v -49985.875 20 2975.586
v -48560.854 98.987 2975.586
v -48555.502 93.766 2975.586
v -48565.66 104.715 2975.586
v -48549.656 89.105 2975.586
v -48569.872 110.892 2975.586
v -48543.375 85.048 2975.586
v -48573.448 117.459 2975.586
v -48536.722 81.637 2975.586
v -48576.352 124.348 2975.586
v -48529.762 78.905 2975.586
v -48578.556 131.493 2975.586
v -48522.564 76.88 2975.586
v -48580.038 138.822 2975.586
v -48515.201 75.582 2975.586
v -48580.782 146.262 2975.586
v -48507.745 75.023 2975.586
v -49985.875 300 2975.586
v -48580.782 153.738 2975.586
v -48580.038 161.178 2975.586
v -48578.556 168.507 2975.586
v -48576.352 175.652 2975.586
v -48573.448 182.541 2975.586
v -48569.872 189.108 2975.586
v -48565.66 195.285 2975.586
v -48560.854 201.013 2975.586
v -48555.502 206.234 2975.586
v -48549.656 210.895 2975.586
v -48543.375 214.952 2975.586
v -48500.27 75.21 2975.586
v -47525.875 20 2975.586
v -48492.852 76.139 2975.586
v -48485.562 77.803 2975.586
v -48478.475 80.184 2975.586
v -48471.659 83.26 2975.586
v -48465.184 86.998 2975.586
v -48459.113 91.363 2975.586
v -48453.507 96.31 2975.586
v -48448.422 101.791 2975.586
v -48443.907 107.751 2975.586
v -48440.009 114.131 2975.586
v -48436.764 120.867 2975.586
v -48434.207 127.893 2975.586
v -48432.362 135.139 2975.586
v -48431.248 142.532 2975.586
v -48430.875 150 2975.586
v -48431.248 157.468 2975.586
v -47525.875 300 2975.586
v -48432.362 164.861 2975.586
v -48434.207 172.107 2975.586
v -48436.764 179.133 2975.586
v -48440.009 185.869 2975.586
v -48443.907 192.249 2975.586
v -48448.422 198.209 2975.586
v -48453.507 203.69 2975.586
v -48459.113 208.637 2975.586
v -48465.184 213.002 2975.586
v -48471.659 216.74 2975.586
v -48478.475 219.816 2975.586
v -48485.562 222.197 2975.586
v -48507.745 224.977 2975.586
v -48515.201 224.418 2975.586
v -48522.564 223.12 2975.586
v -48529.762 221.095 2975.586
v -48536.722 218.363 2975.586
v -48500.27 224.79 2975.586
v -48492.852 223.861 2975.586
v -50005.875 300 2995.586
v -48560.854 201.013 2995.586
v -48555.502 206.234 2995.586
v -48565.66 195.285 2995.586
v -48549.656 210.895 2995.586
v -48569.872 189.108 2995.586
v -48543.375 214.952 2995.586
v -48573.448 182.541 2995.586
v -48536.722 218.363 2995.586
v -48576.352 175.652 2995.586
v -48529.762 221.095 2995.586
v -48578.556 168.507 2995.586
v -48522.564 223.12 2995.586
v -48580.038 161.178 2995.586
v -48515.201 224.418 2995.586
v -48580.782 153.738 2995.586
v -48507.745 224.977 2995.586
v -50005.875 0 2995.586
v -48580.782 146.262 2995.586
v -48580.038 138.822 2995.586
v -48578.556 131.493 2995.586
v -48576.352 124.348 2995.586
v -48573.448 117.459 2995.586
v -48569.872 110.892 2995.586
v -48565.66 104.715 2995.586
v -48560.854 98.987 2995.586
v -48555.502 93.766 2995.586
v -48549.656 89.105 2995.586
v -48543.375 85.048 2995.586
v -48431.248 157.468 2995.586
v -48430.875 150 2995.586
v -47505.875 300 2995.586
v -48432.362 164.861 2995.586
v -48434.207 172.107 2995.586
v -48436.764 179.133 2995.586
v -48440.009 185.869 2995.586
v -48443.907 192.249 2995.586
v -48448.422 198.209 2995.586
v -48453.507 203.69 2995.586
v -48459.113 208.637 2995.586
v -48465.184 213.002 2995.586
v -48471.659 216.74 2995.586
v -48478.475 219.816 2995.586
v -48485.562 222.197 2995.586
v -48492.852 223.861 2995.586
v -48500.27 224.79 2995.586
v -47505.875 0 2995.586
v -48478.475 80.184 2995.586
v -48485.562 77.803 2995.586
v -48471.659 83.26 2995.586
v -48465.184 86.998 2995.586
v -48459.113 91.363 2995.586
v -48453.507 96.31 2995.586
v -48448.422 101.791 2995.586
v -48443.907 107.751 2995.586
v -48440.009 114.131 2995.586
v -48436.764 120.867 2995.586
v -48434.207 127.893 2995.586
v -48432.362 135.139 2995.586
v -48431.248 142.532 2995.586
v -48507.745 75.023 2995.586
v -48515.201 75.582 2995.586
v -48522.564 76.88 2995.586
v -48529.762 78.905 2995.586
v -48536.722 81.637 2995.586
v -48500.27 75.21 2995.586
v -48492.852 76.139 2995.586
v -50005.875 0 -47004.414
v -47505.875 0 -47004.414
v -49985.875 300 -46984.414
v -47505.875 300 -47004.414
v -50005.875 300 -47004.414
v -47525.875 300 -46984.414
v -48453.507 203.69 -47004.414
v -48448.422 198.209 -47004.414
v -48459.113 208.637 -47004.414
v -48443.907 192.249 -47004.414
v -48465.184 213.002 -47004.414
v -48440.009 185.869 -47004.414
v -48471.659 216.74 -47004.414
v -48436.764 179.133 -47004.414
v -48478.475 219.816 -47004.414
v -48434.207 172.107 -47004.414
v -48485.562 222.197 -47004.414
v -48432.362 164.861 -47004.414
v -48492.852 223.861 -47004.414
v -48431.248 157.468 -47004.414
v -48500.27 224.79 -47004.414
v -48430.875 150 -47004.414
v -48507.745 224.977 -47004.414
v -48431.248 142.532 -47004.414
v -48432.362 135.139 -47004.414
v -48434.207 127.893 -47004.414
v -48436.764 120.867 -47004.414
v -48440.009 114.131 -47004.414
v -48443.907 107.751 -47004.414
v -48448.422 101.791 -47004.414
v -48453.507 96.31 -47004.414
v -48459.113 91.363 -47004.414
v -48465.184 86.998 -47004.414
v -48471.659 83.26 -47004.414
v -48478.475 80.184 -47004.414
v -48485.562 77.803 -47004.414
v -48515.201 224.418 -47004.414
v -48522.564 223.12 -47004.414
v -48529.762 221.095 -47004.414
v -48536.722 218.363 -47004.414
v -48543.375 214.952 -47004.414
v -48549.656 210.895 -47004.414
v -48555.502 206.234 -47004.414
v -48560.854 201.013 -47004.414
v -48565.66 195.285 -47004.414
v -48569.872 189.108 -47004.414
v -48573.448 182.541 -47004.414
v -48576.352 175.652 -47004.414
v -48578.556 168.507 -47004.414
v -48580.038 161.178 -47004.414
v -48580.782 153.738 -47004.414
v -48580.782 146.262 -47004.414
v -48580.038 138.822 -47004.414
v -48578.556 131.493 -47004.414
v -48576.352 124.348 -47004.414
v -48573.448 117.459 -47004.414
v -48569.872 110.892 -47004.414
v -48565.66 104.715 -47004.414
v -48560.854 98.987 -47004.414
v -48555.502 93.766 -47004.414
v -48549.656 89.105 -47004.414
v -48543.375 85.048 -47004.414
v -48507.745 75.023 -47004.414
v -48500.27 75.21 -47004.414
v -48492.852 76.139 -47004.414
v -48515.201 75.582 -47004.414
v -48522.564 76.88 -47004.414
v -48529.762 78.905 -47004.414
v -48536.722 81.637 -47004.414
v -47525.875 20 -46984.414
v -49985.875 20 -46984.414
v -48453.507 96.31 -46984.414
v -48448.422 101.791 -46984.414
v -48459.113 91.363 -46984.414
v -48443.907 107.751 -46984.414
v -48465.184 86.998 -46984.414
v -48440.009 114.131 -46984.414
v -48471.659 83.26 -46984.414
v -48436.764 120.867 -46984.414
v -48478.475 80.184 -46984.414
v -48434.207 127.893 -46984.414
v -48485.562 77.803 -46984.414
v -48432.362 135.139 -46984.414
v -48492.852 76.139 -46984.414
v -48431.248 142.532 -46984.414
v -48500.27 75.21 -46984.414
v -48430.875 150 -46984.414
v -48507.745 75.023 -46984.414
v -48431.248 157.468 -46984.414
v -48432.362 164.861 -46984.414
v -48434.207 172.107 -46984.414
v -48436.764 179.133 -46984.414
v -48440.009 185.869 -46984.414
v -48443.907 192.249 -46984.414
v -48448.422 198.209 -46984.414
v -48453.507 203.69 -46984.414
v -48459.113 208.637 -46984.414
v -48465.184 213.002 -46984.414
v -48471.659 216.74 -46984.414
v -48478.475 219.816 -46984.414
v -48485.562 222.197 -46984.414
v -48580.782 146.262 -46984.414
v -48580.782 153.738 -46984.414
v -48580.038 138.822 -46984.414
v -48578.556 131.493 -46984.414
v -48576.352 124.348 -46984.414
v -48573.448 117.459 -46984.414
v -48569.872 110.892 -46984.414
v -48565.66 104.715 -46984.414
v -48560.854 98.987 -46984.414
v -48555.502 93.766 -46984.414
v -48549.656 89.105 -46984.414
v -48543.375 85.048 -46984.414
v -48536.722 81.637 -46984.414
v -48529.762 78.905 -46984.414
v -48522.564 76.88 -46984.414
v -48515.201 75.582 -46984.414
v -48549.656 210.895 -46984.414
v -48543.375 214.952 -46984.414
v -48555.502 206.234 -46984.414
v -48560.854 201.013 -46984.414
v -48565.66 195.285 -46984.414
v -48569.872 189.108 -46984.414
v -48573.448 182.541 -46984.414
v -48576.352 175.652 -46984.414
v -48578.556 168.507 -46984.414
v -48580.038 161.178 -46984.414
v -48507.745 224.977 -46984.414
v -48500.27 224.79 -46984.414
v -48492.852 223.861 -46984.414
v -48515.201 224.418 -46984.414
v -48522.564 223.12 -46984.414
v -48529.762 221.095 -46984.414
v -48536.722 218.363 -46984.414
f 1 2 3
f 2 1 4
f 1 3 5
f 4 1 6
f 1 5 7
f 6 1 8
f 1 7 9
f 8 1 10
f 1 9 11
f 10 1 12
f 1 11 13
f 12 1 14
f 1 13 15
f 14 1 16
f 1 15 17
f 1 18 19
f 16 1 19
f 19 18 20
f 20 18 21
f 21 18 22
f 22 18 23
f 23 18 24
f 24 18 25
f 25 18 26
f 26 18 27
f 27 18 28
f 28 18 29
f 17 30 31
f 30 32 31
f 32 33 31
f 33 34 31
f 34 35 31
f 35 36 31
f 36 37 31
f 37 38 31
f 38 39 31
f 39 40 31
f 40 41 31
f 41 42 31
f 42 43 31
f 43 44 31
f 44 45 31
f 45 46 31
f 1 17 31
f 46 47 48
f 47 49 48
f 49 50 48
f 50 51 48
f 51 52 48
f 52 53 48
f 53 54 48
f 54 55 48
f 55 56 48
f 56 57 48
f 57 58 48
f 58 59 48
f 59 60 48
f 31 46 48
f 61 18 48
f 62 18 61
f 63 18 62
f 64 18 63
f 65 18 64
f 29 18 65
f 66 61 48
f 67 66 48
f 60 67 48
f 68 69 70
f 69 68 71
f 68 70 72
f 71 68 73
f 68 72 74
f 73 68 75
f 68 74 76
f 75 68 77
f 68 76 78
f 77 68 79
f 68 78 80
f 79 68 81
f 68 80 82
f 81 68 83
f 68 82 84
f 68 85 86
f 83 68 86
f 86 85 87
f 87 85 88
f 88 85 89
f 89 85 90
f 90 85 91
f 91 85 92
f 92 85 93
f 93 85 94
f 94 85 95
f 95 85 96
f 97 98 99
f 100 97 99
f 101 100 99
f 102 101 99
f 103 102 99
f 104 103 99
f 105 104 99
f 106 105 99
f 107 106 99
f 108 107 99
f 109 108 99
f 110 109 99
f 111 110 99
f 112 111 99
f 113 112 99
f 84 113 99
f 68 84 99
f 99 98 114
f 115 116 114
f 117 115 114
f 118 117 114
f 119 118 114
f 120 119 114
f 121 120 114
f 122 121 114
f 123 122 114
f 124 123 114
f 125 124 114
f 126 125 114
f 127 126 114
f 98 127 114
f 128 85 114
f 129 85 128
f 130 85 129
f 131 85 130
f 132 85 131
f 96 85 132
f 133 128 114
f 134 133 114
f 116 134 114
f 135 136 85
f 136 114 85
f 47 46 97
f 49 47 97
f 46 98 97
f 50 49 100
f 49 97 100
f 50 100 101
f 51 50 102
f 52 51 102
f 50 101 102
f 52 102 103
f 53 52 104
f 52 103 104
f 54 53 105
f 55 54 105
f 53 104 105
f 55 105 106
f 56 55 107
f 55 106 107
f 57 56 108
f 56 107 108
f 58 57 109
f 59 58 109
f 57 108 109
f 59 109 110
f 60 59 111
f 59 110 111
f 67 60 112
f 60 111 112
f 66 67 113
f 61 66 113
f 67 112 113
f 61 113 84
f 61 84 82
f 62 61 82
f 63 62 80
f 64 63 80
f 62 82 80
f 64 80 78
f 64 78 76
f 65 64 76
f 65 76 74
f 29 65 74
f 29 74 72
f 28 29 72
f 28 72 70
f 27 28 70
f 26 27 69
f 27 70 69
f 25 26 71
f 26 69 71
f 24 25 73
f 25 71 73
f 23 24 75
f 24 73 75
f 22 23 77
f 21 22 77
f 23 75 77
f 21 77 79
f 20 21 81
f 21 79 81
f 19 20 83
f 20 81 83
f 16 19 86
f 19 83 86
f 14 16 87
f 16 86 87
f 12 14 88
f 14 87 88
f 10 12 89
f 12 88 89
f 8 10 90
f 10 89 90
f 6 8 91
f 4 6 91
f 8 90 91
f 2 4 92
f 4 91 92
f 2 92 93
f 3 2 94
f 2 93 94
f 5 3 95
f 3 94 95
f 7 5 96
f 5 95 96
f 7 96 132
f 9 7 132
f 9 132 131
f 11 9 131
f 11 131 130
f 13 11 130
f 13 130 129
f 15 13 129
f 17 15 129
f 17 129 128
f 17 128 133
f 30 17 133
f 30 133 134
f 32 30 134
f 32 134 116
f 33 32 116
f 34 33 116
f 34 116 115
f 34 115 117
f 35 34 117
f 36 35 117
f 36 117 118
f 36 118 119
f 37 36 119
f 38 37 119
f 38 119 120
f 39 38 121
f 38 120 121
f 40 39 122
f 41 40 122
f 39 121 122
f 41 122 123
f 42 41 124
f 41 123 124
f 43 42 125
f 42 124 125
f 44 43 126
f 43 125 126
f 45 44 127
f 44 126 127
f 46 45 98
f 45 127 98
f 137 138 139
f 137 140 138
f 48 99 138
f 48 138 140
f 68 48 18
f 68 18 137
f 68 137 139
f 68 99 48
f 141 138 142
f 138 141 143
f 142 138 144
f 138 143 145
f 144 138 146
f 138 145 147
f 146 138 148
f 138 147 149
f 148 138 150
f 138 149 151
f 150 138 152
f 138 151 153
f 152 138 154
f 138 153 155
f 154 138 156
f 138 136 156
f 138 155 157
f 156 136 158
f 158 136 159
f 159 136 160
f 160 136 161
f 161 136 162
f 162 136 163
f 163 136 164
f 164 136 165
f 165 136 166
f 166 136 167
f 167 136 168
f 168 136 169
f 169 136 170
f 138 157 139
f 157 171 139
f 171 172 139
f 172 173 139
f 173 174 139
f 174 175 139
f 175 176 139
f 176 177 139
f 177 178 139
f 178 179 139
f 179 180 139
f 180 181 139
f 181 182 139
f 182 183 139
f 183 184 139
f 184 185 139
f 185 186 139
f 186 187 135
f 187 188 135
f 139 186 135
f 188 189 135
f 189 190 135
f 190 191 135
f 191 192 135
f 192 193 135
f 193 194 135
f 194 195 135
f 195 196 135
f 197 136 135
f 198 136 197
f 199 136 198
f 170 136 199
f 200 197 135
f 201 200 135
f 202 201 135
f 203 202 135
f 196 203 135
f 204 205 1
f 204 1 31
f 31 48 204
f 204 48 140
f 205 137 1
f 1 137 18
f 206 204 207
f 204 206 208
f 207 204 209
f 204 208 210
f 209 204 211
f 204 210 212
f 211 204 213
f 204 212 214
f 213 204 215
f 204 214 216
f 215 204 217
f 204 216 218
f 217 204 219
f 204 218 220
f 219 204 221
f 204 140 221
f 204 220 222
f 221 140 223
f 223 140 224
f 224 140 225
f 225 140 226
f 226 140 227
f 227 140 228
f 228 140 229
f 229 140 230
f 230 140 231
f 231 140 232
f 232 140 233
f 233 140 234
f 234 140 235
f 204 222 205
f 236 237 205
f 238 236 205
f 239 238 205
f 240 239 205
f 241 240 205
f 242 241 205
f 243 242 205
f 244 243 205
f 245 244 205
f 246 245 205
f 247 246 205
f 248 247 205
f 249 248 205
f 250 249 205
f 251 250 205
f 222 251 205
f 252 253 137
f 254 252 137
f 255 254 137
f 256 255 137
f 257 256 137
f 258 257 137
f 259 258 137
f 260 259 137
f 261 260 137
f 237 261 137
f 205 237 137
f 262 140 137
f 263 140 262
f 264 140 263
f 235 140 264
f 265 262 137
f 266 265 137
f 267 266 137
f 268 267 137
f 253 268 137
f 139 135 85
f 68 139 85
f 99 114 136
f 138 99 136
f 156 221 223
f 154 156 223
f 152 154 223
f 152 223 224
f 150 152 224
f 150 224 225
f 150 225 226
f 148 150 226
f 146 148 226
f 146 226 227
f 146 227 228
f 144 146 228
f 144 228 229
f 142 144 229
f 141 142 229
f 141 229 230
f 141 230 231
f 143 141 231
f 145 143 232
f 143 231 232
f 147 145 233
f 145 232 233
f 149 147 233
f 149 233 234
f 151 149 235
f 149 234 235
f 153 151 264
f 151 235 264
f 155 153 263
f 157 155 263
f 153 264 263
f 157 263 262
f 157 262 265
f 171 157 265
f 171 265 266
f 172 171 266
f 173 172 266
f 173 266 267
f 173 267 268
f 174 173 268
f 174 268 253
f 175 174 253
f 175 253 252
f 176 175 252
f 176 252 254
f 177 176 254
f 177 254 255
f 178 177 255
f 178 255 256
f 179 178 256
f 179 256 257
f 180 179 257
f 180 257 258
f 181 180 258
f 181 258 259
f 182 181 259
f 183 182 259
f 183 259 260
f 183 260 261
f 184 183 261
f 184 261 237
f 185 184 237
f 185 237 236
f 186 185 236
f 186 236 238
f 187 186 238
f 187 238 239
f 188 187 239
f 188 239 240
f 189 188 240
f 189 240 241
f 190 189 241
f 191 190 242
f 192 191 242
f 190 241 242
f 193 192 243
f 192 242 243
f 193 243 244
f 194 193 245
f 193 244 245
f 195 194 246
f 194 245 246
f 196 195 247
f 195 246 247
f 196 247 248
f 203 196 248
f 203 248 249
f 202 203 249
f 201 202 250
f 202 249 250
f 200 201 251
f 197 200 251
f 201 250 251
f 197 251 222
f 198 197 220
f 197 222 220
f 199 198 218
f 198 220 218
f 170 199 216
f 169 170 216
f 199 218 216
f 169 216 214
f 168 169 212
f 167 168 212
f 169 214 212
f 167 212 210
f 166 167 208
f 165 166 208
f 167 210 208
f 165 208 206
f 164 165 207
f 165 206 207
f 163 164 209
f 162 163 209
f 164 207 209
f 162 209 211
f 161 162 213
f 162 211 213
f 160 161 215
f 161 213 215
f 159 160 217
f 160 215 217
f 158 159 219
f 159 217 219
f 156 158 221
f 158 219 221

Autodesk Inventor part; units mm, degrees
ref_plane "YZ Plane" through (0, 0, 0) normal (1, 0, 0) x (0, 1, 0)
ref_plane "XZ Plane" through (0, 0, 0) normal (0, 1, 0) x (-1, 0, 0)
ref_plane "XY Plane" through (0, 0, 0) normal (0, 0, 1) x (1, 0, 0)
sketch "Sketch1" plane through (0, 0, 0) normal (0, 1, 0) x (-1, 0, 0)
  line L0 (47505.8752, -47004.4138) -> (50005.8752, -47004.4138)
  line L1 (50005.8752, -47004.4138) -> (50005.8752, 2995.5862)
  line L2 (50005.8752, 2995.5862) -> (47505.8752, 2995.5862)
  line L3 (47505.8752, 2995.5862) -> (47505.8752, -47004.4138)
  point P0 (0, 0)
  dimension "d0" = 2500
  dimension "d1" = 50000
extrude "Extrusion1" add sketch "Sketch1" along normal blind 300
sketch "Sketch2" plane through (0, 300, 0) normal (0, 1, 0) x (1, 0, 0)
  line L0 (-47525.8752, 46984.4138) -> (-49985.8752, 46984.4138)
  line L1 (-49985.8752, 46984.4138) -> (-49985.8752, -2975.5862)
  line L2 (-49985.8752, -2975.5862) -> (-47525.8752, -2975.5862)
  line L3 (-47525.8752, -2975.5862) -> (-47525.8752, 46984.4138)
  line L4 (-47505.8752, -2995.5862) -> (-47505.8752, 47004.4138) projected
  line L5 (-50005.8752, 47004.4138) -> (-50005.8752, -2995.5862) projected
  line L6 (-47505.8752, 47004.4138) -> (-50005.8752, 47004.4138) projected
  line L7 (-50005.8752, -2995.5862) -> (-47505.8752, -2995.5862) projected
  point P0 (0, 0)
  dimension "d4" = 20
  dimension "d5" = 20
  dimension "d6" = 20
  dimension "d7" = 20
extrude "Extrusion2" cut sketch "Sketch2" against normal blind 280 contours L3 L2 L1 L0
sketch "Sketch3" plane through (-50005.8752, 0, 2995.5862) normal (0, 0, 1) x (1, 0, 0)
  line L0 (2480, 300) -> (20, 300) projected
  circle A0 centre (1500, 150) radius 75
  point P0 (50005.8752, 0)
  dimension "d10" = 150
extrude "Extrusion3" cut sketch "Sketch3" against normal blind 55000
properties part number "dwc"
